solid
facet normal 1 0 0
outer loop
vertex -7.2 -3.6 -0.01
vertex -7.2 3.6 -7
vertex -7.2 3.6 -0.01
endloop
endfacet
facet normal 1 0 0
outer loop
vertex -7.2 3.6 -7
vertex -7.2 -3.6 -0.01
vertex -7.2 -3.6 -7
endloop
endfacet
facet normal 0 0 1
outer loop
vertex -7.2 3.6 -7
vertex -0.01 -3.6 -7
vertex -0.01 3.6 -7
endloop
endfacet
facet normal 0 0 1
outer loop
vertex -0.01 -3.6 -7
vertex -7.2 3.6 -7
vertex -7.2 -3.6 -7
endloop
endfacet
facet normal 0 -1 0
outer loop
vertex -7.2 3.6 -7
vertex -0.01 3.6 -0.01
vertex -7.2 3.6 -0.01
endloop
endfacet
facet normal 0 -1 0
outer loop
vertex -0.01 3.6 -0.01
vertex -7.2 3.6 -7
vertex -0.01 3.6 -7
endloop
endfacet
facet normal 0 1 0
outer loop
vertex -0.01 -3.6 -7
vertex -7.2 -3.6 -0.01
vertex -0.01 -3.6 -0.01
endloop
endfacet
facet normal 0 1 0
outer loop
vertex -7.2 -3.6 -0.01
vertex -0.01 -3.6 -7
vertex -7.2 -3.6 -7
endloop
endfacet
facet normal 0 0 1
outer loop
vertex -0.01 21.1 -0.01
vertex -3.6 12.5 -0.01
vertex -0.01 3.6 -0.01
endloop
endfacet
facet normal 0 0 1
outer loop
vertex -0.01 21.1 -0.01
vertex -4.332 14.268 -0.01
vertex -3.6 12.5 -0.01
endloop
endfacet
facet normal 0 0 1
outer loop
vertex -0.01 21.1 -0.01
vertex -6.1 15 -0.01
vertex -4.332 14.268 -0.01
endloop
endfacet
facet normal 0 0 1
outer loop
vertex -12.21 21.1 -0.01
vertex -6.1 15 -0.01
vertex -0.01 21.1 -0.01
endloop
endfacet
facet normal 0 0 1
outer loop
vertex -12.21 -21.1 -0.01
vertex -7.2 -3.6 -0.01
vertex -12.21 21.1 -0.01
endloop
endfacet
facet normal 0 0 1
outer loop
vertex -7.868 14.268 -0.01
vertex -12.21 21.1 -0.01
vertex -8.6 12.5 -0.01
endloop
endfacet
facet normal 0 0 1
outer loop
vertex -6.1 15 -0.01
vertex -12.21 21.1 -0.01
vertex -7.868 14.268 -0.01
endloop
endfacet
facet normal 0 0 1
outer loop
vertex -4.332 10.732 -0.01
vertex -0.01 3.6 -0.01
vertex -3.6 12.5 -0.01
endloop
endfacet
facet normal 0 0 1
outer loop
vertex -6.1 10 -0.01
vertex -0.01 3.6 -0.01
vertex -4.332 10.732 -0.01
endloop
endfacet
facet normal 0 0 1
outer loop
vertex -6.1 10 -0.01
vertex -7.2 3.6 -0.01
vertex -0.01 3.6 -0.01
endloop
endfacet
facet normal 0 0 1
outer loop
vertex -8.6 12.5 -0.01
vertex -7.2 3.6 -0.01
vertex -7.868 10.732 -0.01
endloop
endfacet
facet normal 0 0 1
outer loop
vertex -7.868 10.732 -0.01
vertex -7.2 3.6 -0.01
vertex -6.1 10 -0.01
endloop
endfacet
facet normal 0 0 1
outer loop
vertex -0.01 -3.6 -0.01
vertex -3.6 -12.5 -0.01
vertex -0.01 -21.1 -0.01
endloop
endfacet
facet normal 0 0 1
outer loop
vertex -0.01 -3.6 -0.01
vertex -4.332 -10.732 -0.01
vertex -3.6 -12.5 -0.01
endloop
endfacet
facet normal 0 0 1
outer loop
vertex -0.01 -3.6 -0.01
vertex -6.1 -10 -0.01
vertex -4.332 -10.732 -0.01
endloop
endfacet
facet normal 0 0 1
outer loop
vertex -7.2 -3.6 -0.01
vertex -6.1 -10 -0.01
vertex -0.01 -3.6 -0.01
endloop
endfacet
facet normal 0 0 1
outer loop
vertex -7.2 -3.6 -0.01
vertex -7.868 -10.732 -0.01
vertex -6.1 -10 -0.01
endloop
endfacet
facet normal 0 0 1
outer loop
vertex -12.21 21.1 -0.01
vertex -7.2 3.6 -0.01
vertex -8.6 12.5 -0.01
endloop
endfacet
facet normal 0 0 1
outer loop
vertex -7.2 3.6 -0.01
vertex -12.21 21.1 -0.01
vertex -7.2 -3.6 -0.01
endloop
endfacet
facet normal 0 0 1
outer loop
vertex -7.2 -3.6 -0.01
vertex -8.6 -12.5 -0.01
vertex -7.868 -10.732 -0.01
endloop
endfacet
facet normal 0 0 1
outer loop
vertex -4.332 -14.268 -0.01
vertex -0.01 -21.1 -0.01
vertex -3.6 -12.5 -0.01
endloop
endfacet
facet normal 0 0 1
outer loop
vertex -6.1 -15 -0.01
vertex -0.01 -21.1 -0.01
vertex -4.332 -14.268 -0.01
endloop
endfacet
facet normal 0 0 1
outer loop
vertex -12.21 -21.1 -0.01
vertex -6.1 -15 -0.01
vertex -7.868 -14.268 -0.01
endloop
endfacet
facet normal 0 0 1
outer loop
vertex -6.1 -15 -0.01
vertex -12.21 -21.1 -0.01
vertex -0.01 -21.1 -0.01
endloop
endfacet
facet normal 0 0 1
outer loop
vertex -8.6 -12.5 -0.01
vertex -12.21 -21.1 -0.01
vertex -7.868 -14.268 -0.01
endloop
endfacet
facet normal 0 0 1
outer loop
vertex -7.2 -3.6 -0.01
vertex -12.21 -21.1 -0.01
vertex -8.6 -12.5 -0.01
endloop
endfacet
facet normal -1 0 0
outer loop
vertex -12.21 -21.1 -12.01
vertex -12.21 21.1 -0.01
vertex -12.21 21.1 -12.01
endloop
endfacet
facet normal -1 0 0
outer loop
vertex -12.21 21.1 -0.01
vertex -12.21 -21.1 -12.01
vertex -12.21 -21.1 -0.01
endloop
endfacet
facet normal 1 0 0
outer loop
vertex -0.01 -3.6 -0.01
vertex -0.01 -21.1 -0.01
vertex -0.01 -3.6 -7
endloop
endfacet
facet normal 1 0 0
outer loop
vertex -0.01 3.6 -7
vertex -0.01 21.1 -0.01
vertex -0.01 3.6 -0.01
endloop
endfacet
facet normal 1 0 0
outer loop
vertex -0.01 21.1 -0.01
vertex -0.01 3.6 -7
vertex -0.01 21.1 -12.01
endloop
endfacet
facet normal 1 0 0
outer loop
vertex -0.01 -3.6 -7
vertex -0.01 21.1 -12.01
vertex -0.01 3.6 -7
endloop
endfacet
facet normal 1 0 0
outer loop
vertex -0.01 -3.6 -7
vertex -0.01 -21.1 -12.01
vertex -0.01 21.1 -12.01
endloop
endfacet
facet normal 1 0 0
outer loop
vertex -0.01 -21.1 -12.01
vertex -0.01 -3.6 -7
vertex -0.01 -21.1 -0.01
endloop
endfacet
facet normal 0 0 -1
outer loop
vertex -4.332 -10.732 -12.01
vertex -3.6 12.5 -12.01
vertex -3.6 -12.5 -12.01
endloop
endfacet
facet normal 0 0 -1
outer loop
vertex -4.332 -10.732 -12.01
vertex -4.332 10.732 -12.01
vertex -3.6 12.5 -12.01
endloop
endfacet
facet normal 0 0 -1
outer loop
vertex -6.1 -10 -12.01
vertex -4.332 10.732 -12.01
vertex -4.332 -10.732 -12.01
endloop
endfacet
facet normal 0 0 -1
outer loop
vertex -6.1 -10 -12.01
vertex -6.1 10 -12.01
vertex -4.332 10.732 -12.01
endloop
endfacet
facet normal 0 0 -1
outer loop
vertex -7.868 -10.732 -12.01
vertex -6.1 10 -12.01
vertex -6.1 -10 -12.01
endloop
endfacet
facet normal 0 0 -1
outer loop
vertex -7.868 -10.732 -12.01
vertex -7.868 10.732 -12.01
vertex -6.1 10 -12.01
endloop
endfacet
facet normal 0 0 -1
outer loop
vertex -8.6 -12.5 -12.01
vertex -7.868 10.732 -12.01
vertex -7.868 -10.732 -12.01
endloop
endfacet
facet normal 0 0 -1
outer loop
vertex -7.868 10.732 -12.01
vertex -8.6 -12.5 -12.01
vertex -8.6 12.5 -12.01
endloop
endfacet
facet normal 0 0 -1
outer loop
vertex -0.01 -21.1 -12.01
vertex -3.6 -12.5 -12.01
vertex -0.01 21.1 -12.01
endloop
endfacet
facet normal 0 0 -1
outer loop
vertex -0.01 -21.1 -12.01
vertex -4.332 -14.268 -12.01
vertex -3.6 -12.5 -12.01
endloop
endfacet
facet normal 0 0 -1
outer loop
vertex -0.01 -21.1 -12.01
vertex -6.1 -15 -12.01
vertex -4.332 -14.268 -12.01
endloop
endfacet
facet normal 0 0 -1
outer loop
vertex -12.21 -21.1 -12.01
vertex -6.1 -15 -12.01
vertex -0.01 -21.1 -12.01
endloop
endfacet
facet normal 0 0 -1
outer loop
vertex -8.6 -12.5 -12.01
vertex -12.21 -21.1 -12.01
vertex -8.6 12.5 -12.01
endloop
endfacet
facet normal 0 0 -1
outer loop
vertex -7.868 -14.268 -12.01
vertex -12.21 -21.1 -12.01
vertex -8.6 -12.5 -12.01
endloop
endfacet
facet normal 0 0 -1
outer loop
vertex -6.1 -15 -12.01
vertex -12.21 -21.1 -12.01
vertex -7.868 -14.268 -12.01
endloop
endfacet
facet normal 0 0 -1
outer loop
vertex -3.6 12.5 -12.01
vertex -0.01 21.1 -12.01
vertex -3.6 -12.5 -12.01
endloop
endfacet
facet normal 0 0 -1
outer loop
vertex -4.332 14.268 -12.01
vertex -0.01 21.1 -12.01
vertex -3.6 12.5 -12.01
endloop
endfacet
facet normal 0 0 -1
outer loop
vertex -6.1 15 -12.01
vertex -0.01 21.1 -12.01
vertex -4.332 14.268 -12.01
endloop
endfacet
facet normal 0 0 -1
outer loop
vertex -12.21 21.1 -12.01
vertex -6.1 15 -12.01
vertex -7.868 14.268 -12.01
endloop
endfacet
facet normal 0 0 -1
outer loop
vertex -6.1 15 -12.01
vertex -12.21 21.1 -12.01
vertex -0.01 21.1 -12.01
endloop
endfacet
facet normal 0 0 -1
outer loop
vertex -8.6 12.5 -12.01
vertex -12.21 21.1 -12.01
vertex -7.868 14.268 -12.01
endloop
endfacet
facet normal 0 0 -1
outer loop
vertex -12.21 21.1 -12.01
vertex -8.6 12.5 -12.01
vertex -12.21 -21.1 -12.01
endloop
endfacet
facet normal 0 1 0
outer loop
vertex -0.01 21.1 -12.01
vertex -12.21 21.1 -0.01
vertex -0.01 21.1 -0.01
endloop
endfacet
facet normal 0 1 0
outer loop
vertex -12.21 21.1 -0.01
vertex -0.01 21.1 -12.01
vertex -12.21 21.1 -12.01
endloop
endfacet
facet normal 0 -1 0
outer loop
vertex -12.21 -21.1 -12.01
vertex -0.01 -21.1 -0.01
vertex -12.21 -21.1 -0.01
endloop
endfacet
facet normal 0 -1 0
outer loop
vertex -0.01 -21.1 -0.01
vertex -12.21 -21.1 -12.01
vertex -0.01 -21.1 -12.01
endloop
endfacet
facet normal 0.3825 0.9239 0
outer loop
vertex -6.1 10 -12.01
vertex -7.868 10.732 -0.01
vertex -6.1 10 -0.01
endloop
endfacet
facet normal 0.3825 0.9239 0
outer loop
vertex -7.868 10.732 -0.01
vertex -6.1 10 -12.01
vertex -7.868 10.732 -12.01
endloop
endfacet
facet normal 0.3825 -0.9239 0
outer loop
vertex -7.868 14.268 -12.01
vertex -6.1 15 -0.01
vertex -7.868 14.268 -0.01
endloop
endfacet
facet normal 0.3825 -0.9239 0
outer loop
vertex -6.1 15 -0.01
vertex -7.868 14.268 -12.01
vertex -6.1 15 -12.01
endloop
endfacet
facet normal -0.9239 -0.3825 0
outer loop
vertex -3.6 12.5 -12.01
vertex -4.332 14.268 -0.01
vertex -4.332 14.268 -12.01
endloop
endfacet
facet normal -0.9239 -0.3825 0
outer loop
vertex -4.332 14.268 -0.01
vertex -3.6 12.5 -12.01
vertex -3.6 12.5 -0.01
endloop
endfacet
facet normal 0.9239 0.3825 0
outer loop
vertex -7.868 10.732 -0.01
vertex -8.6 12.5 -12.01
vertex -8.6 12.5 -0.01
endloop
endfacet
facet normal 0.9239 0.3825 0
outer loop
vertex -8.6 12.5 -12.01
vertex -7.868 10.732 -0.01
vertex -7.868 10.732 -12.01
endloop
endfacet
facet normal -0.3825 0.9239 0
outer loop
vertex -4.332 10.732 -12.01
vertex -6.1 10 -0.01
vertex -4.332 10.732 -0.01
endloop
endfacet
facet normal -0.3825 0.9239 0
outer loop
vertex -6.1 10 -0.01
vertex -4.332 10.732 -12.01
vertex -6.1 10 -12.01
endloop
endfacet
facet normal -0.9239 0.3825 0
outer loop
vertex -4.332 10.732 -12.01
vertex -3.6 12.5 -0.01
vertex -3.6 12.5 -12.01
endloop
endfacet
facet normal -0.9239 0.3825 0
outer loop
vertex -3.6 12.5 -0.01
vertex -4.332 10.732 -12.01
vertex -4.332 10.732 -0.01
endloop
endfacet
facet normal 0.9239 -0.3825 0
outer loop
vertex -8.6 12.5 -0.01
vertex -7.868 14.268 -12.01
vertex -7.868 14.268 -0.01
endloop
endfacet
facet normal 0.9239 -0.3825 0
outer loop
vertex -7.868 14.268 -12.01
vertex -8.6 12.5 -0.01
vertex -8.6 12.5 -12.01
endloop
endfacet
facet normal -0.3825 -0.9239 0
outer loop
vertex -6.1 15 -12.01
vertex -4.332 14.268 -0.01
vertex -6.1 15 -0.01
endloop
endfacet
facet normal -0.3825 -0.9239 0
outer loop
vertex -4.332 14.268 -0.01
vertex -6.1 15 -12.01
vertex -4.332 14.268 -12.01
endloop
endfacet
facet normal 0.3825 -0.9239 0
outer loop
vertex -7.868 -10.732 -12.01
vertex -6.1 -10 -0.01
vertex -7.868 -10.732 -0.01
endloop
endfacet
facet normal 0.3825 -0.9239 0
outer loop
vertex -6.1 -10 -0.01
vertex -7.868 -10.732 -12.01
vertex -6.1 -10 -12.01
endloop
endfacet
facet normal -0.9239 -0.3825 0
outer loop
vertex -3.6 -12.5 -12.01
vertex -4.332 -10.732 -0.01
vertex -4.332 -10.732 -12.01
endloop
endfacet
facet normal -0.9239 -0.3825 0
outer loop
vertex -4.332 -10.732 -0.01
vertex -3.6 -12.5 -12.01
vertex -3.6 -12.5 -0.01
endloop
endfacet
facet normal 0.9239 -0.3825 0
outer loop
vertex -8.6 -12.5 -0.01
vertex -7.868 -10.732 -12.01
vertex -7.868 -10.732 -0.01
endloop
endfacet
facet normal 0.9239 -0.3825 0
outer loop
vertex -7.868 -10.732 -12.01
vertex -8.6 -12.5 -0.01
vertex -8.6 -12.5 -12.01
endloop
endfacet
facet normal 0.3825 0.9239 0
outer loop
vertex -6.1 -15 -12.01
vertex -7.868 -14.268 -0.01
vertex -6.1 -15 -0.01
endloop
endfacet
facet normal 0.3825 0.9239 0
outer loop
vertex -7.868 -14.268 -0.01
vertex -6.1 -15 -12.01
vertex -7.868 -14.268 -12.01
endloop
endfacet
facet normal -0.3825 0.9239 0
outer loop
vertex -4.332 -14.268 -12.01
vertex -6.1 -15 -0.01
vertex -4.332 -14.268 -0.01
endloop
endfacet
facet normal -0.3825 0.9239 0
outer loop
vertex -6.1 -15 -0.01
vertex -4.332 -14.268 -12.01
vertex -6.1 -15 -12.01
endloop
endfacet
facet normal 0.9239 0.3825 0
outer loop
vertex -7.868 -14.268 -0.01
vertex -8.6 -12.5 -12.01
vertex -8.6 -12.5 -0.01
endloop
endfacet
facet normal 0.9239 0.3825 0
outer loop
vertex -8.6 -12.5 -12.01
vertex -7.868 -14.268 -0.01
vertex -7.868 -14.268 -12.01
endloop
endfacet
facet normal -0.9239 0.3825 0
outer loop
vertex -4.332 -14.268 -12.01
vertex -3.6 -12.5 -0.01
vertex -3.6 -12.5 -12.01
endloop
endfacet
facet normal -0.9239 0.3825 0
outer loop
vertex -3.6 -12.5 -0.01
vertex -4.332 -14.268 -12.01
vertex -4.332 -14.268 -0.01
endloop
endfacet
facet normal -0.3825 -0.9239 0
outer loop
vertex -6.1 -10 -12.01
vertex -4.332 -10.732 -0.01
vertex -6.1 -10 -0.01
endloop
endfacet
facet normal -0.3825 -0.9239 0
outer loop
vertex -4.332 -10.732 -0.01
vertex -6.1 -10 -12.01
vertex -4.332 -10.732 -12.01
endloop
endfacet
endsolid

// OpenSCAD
module SMAConnector()
{
  translate([0, 0, 3.6])
    cube([7, 7.2, 7.2], center=true);
  translate([3.6, 0, 3.6])
    rotate([0, 90, 0])
      cylinder(r=2.7, h=10);
}

module SMAHousingBlock(sides, thickness)
{
  cube_w = 7.2 + 2 * sides;
  cube_h = 7.2 + thickness;
  cube_d = 7 + thickness;
  cube_h_offset = (cube_h / 2) + 0.01;
  cube_d_offset = -((cube_d / 2) + 0.01);
  difference()
  {
    translate([cube_d_offset, 0, cube_h_offset])
      cube([cube_d, cube_w, cube_h], center=true);
    translate([-3.5, 0, 0])
      SMAConnector();
  }
}

module SMAMountingHoles(thickness, centres, radius, z_position=3.6)
{
  length = 7.2 + thickness + 2;
  translate([-length+1, centres/2, z_position])
    rotate([0, 90, 0])
      cylinder(r=radius, h=length);
  translate([-length+1, -centres/2, z_position])
    rotate([0, 90, 0])
      cylinder(r=radius, h=length);
}

module SMAMounting(thickness, centres, radius)
{
  side_width = (centres / 2) + thickness;
  holes_z_position = (7.2 + thickness) / 2;
  difference()
  {
    SMAHousingBlock(side_width, thickness);
    SMAMountingHoles(thickness, centres, radius, holes_z_position);
  }
}

rotate([0, -90, 0])
  SMAMounting(5, 25, 2.5);
